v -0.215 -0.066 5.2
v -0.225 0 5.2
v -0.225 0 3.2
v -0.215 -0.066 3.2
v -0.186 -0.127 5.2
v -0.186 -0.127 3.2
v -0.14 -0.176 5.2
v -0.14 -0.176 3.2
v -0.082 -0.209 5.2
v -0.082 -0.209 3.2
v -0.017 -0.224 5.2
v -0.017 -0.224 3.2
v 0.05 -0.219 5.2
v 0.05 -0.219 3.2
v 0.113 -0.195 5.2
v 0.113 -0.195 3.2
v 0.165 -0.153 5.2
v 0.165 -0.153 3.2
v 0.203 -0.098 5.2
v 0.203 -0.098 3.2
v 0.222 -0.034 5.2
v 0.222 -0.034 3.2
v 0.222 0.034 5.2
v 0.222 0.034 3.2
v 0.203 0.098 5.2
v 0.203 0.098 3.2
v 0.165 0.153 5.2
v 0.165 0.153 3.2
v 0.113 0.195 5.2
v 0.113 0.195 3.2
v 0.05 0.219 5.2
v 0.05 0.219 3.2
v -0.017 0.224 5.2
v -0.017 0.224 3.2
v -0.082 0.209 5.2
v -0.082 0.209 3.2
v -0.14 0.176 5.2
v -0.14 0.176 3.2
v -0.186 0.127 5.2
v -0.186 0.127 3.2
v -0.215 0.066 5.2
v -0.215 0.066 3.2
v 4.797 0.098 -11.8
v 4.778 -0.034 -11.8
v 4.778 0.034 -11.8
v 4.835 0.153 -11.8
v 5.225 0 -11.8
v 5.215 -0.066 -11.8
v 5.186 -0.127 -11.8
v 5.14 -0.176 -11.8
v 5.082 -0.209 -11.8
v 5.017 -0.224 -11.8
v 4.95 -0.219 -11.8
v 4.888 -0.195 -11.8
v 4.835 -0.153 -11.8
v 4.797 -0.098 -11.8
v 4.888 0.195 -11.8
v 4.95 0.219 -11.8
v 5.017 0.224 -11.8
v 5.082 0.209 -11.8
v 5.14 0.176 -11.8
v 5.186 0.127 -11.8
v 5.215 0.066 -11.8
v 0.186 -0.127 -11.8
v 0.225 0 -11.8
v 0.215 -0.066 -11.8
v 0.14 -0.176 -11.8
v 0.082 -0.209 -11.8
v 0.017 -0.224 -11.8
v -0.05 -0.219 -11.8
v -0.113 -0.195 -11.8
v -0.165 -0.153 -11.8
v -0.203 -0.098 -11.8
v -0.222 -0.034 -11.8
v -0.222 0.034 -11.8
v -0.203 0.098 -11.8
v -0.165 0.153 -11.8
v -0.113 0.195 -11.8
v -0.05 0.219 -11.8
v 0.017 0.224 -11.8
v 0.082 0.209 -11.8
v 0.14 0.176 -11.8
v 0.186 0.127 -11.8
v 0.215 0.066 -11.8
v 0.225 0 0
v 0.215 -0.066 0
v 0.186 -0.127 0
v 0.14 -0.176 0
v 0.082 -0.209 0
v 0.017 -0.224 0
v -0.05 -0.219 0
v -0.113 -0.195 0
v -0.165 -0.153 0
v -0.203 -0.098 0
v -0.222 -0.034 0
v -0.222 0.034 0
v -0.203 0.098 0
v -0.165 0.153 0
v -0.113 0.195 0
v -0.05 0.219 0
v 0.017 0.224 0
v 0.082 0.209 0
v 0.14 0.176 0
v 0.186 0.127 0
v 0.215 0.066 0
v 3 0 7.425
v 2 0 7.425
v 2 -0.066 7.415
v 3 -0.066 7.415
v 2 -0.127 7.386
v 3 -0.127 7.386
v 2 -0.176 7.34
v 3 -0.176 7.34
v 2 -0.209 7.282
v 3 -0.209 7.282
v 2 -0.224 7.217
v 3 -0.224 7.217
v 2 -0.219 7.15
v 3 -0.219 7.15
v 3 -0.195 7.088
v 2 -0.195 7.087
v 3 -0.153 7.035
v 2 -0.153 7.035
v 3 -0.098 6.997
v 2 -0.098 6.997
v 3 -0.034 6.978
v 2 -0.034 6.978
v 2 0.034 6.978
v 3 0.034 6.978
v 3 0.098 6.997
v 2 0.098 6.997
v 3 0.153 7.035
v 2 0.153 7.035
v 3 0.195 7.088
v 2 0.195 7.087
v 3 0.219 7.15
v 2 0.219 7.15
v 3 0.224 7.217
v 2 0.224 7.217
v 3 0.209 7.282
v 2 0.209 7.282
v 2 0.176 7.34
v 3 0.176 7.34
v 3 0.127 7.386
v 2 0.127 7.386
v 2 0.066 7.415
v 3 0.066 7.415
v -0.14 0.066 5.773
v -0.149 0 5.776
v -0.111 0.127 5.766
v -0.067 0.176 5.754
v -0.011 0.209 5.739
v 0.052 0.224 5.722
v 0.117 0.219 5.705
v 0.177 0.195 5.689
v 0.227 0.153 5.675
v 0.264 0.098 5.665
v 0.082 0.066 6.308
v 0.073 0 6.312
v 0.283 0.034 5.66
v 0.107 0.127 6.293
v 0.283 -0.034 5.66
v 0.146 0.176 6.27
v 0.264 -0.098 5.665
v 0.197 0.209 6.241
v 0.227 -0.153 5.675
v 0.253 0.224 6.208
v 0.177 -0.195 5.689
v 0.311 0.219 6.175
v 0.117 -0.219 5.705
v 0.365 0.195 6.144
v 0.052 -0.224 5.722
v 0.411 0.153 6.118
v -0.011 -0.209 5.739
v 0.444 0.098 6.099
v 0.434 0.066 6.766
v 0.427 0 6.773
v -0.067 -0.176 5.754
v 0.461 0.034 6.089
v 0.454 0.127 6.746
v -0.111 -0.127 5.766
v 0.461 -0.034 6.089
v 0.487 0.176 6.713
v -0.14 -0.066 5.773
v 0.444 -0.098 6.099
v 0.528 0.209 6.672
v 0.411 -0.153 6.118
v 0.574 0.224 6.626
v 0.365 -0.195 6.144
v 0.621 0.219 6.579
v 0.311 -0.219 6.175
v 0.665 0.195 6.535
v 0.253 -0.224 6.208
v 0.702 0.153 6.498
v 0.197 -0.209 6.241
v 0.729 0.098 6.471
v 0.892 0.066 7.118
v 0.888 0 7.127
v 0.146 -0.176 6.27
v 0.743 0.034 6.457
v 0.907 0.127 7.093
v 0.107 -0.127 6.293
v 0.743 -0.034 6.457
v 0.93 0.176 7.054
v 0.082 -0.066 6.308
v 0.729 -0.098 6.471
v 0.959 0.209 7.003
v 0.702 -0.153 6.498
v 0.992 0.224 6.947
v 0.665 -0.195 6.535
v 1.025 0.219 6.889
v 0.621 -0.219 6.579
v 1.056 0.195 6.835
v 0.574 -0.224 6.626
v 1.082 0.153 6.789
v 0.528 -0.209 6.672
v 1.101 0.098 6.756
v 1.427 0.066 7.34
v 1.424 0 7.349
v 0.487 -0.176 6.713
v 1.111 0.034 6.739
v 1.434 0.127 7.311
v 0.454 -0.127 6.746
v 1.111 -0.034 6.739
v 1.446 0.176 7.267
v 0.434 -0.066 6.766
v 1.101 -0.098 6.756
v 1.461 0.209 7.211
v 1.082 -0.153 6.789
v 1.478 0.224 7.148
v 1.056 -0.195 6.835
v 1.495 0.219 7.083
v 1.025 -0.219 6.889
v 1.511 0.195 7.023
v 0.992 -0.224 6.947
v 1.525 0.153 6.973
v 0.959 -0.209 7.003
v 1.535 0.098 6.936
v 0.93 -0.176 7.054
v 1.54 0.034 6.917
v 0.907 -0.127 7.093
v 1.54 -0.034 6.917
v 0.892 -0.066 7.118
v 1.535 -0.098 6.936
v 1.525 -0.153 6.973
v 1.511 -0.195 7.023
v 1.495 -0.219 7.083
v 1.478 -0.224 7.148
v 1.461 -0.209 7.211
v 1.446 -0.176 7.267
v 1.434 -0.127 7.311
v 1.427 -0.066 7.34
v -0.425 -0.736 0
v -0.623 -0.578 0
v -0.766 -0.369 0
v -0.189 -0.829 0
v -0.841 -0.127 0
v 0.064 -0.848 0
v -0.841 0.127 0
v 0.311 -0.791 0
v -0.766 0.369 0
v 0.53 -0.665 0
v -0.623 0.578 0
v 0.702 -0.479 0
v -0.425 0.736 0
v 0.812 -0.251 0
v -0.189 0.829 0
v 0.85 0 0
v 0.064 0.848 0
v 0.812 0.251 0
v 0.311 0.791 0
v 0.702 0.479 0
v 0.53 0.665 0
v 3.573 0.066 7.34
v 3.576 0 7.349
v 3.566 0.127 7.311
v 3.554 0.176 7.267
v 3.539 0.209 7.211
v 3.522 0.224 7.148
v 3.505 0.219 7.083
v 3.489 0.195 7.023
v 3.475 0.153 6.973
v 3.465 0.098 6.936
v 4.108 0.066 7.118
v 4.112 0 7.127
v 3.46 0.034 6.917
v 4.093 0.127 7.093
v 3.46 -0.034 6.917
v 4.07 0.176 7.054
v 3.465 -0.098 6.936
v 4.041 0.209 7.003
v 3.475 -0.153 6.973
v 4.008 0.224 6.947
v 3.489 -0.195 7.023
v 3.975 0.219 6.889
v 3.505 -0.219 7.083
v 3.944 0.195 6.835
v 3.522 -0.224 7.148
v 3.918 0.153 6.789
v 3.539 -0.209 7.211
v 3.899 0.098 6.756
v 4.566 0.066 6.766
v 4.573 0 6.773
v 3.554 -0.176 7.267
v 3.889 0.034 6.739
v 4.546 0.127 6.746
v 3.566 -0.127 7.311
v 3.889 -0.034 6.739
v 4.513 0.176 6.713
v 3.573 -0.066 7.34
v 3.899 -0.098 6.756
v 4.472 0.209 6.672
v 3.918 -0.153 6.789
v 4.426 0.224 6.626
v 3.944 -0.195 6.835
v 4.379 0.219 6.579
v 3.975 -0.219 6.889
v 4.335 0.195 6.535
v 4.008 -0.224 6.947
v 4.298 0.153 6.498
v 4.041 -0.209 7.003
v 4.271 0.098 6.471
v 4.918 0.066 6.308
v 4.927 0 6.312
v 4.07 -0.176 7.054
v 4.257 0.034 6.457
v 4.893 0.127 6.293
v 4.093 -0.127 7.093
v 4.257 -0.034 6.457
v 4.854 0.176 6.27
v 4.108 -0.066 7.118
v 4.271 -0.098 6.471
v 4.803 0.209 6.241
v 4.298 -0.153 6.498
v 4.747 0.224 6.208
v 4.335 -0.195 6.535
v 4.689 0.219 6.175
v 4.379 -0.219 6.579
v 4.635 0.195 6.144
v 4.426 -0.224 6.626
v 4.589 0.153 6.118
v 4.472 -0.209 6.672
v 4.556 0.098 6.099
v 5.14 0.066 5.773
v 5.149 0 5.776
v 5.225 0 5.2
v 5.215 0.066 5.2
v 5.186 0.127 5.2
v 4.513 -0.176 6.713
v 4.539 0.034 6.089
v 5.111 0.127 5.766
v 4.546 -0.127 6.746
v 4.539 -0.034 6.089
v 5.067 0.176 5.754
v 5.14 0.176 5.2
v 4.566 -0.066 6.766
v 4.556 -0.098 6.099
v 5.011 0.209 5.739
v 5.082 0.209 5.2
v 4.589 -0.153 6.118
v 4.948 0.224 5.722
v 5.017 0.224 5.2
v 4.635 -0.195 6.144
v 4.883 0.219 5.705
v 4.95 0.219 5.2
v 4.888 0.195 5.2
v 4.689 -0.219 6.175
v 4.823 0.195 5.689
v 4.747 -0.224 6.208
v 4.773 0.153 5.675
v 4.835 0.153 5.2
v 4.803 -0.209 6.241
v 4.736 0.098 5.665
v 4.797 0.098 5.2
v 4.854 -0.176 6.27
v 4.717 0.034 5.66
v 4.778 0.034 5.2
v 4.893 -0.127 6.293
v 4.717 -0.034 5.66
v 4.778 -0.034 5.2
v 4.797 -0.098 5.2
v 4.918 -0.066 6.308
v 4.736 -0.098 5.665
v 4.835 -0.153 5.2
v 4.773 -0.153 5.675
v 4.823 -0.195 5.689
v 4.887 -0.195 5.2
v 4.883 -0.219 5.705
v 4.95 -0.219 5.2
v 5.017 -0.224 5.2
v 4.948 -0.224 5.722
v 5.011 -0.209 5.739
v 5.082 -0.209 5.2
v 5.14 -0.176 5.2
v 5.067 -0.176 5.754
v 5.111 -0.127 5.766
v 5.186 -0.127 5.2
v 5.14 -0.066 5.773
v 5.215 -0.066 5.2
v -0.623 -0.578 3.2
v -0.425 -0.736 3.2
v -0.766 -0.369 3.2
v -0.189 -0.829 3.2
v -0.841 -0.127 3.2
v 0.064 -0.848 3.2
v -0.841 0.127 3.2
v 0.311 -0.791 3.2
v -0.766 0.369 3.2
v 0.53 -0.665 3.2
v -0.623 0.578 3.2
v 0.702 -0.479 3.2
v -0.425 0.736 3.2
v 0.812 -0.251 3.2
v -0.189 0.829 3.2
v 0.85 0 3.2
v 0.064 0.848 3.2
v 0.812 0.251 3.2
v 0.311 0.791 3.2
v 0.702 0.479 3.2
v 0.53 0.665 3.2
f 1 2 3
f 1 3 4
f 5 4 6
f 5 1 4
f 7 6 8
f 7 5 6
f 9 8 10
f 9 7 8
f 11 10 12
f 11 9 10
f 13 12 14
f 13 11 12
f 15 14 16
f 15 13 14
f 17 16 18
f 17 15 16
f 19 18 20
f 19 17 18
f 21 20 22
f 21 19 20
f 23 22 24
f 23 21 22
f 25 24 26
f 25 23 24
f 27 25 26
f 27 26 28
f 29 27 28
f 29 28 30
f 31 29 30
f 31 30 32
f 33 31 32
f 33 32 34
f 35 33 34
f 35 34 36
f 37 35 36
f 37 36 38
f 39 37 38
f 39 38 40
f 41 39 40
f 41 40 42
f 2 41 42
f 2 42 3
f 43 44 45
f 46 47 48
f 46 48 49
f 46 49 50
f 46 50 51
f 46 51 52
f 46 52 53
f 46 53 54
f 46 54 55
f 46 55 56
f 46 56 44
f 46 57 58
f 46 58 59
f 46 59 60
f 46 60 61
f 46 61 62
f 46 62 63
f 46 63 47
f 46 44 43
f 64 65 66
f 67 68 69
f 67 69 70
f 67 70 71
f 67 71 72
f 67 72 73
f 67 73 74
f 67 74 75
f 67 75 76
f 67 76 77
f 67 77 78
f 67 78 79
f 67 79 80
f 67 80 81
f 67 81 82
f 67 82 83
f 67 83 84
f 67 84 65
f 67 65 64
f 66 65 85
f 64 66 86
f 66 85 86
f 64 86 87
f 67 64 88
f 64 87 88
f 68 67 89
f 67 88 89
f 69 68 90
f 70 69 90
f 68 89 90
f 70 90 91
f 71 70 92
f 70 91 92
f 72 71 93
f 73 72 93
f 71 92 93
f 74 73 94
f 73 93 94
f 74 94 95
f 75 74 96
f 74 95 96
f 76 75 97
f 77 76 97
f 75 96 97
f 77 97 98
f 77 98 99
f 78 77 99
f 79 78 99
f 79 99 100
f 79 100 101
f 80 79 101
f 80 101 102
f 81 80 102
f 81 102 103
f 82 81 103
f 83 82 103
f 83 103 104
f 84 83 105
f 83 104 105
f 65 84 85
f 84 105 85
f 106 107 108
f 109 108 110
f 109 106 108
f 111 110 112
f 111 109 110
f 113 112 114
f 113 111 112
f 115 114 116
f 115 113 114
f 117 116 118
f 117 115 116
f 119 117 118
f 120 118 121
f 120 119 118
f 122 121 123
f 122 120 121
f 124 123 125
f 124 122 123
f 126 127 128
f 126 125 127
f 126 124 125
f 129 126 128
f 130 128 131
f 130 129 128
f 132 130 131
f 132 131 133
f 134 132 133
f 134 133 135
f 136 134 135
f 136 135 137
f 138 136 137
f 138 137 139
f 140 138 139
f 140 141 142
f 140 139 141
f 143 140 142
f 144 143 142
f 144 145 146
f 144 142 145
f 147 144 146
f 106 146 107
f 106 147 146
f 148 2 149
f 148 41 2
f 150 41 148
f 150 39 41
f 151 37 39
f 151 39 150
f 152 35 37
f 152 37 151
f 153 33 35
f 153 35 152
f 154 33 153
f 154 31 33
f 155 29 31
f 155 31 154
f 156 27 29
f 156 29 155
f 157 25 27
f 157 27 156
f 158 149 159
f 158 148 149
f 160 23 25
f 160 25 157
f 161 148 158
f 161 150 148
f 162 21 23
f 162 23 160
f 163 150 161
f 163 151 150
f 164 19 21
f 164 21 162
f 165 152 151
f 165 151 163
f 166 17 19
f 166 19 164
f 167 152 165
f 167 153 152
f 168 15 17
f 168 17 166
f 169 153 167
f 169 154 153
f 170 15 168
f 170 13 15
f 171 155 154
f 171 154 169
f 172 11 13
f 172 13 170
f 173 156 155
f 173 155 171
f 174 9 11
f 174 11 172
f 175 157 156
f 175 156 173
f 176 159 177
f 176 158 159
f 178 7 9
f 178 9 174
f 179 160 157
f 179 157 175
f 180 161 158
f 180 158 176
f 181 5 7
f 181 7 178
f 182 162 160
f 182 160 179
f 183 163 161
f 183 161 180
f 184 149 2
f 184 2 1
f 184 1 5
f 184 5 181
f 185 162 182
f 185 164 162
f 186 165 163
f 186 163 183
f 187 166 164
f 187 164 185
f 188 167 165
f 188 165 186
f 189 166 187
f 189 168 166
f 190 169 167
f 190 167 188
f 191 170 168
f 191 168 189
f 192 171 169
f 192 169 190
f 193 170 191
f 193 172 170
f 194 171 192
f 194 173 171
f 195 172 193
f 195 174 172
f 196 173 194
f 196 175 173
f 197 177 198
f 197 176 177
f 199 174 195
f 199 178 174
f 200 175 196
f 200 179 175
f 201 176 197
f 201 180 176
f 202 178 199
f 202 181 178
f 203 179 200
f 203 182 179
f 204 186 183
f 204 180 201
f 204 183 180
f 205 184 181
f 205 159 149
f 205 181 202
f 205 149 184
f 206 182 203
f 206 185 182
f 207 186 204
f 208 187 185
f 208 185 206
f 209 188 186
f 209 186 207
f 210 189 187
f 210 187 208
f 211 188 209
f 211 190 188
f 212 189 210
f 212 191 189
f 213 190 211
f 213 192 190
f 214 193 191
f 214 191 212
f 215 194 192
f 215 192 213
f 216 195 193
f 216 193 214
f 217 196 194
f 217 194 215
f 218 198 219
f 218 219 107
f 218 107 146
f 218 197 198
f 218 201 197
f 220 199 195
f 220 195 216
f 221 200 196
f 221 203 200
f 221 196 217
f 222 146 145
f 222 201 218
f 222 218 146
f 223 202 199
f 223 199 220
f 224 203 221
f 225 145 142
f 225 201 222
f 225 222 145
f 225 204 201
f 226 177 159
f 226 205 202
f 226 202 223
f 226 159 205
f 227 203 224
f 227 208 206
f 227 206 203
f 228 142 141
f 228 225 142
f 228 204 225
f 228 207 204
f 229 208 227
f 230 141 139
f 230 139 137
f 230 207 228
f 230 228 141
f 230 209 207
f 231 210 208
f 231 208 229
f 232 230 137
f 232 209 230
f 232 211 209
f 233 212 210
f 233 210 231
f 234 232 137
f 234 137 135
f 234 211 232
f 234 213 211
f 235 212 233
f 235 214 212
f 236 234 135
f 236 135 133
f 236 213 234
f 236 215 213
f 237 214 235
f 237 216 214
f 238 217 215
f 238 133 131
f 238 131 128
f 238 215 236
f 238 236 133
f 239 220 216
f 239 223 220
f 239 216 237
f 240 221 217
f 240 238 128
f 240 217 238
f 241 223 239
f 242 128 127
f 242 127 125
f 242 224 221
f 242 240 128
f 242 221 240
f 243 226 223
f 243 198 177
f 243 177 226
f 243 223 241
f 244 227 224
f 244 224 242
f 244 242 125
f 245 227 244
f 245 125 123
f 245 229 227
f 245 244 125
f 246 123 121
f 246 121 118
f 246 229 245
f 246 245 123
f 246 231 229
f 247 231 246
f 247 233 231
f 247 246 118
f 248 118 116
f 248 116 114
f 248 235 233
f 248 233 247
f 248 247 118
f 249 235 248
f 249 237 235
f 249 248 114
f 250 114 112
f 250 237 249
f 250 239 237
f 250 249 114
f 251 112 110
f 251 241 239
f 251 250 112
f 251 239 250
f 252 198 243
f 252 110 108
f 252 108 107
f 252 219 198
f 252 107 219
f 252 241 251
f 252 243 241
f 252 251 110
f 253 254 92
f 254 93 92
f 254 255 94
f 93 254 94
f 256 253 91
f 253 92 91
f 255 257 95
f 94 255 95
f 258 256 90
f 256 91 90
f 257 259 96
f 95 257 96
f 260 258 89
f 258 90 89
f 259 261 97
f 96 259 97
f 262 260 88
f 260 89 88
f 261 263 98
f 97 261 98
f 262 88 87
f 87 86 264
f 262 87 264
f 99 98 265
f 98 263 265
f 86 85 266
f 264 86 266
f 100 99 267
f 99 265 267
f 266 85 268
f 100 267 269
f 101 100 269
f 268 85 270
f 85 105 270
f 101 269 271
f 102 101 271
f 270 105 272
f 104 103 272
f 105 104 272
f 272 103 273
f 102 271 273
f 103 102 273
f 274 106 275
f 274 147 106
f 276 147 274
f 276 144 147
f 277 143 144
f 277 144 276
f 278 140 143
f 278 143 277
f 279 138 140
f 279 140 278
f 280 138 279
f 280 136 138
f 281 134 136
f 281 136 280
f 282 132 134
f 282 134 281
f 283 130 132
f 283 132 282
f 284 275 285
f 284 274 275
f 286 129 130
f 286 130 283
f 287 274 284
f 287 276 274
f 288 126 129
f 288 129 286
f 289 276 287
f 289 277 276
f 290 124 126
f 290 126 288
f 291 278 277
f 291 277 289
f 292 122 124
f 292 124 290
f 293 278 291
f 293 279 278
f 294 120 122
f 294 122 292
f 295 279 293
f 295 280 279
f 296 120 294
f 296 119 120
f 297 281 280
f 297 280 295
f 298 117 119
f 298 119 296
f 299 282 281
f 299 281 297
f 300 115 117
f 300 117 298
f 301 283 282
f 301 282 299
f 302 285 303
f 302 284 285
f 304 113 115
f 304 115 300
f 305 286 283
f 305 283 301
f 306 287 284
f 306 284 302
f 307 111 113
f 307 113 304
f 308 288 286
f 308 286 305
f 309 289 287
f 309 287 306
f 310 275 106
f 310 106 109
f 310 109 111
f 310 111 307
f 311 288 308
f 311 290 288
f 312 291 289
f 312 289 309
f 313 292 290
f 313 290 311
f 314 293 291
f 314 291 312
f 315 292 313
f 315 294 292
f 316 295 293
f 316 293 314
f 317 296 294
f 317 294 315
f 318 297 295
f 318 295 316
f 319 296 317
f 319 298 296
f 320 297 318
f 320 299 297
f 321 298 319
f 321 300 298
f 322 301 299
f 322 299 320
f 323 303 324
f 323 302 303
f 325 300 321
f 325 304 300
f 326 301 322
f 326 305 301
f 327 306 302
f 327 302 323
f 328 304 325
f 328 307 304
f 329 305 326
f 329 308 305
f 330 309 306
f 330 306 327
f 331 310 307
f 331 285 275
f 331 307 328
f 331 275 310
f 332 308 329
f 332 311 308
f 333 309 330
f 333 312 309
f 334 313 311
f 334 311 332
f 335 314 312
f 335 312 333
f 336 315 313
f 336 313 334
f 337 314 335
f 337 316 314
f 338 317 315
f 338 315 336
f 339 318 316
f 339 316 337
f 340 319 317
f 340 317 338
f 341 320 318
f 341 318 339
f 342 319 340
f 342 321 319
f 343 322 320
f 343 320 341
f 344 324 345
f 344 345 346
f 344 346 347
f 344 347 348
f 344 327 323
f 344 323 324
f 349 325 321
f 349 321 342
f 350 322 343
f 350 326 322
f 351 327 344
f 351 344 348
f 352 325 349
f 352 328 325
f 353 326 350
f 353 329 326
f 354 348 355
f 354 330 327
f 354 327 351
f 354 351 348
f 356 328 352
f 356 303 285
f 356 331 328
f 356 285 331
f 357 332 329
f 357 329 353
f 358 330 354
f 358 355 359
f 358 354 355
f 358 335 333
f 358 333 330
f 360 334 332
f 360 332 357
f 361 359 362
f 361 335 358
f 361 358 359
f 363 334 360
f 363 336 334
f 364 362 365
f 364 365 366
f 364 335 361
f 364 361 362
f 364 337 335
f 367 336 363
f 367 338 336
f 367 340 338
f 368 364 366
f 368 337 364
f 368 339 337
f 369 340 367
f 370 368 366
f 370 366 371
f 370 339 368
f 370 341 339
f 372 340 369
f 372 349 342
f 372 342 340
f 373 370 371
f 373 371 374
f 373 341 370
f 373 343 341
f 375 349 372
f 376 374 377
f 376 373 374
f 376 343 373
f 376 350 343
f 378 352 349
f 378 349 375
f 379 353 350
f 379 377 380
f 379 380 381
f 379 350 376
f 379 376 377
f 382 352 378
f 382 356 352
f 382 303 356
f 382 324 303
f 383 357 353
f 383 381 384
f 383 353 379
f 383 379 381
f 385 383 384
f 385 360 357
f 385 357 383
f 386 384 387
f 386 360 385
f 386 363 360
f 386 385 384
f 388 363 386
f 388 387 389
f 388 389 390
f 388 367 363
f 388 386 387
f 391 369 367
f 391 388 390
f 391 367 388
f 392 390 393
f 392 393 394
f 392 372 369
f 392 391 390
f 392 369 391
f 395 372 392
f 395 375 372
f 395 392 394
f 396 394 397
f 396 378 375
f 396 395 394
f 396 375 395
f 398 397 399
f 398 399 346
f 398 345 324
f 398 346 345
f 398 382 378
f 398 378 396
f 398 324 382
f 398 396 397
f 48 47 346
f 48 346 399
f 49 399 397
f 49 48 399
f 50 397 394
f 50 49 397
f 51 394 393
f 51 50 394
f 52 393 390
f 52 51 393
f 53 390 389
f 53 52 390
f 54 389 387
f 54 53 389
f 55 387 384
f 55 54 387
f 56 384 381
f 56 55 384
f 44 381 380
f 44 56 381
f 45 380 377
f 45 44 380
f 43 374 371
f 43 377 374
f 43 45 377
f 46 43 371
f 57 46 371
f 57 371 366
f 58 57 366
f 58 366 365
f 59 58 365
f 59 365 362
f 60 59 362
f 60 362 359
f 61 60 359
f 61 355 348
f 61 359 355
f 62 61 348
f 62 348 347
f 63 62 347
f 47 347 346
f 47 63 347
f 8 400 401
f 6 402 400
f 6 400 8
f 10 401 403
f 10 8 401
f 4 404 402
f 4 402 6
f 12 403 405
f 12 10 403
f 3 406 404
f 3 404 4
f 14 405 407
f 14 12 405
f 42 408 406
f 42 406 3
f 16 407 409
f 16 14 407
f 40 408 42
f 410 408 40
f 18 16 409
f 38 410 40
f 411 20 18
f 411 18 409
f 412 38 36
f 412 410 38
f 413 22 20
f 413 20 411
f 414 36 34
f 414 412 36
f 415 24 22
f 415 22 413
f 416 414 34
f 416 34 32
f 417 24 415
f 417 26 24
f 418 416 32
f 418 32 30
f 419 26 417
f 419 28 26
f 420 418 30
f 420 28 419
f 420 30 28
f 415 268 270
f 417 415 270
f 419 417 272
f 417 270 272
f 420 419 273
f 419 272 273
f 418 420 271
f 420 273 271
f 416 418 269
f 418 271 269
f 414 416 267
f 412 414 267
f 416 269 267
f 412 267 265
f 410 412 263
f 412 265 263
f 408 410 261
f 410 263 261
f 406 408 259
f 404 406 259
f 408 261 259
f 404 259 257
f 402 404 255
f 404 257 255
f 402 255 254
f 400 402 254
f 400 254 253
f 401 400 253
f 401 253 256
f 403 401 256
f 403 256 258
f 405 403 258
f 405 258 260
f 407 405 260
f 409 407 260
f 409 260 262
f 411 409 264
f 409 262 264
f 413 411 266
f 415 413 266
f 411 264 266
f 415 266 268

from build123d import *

# Parameters (mm, degrees)
SKETCH2_R           = 0.85
RESISTOR_BODY_DEPTH = 3.2
LEAD1_PROFILE_R     = 0.225
SKETCH6_R           = 0.225
LEAD2_DEPTH         = 11.8


with BuildPart() as part:
    # Sketch2 → Resistor Body (new body)
    with BuildSketch(Plane.XY):
        Circle(SKETCH2_R)
    extrude(amount=RESISTOR_BODY_DEPTH)

    # Lead1: sweep along a path in Lead1 Path
    with BuildLine(Plane.XZ) as lead1_path:
        Line((0, 3.2), (0, 5.2))
        ThreePointArc((0, 5.2), (0.585786438, 6.614213562), (2, 7.2))
        Line((2, 7.2), (3, 7.2))
        ThreePointArc((3, 7.2), (4.414213562, 6.614213562), (5, 5.2))
        Line((5, 5.2), (5, -11.8))
    # Lead1 Profile → Lead1 (sweep)
    with BuildSketch(Plane(origin=(0, 0, 3.2), x_dir=(-1, 0, 0), z_dir=(0, 0, 1))):
        Circle(LEAD1_PROFILE_R)
    sweep(path=lead1_path.line)

    # Sketch6 → Lead2 (add)
    with BuildSketch(Plane(origin=(0, 0, 0), x_dir=(1, 0, 0), z_dir=(0, 0, -1))):
        Circle(SKETCH6_R)
    extrude(amount=LEAD2_DEPTH)


solid = part.part
